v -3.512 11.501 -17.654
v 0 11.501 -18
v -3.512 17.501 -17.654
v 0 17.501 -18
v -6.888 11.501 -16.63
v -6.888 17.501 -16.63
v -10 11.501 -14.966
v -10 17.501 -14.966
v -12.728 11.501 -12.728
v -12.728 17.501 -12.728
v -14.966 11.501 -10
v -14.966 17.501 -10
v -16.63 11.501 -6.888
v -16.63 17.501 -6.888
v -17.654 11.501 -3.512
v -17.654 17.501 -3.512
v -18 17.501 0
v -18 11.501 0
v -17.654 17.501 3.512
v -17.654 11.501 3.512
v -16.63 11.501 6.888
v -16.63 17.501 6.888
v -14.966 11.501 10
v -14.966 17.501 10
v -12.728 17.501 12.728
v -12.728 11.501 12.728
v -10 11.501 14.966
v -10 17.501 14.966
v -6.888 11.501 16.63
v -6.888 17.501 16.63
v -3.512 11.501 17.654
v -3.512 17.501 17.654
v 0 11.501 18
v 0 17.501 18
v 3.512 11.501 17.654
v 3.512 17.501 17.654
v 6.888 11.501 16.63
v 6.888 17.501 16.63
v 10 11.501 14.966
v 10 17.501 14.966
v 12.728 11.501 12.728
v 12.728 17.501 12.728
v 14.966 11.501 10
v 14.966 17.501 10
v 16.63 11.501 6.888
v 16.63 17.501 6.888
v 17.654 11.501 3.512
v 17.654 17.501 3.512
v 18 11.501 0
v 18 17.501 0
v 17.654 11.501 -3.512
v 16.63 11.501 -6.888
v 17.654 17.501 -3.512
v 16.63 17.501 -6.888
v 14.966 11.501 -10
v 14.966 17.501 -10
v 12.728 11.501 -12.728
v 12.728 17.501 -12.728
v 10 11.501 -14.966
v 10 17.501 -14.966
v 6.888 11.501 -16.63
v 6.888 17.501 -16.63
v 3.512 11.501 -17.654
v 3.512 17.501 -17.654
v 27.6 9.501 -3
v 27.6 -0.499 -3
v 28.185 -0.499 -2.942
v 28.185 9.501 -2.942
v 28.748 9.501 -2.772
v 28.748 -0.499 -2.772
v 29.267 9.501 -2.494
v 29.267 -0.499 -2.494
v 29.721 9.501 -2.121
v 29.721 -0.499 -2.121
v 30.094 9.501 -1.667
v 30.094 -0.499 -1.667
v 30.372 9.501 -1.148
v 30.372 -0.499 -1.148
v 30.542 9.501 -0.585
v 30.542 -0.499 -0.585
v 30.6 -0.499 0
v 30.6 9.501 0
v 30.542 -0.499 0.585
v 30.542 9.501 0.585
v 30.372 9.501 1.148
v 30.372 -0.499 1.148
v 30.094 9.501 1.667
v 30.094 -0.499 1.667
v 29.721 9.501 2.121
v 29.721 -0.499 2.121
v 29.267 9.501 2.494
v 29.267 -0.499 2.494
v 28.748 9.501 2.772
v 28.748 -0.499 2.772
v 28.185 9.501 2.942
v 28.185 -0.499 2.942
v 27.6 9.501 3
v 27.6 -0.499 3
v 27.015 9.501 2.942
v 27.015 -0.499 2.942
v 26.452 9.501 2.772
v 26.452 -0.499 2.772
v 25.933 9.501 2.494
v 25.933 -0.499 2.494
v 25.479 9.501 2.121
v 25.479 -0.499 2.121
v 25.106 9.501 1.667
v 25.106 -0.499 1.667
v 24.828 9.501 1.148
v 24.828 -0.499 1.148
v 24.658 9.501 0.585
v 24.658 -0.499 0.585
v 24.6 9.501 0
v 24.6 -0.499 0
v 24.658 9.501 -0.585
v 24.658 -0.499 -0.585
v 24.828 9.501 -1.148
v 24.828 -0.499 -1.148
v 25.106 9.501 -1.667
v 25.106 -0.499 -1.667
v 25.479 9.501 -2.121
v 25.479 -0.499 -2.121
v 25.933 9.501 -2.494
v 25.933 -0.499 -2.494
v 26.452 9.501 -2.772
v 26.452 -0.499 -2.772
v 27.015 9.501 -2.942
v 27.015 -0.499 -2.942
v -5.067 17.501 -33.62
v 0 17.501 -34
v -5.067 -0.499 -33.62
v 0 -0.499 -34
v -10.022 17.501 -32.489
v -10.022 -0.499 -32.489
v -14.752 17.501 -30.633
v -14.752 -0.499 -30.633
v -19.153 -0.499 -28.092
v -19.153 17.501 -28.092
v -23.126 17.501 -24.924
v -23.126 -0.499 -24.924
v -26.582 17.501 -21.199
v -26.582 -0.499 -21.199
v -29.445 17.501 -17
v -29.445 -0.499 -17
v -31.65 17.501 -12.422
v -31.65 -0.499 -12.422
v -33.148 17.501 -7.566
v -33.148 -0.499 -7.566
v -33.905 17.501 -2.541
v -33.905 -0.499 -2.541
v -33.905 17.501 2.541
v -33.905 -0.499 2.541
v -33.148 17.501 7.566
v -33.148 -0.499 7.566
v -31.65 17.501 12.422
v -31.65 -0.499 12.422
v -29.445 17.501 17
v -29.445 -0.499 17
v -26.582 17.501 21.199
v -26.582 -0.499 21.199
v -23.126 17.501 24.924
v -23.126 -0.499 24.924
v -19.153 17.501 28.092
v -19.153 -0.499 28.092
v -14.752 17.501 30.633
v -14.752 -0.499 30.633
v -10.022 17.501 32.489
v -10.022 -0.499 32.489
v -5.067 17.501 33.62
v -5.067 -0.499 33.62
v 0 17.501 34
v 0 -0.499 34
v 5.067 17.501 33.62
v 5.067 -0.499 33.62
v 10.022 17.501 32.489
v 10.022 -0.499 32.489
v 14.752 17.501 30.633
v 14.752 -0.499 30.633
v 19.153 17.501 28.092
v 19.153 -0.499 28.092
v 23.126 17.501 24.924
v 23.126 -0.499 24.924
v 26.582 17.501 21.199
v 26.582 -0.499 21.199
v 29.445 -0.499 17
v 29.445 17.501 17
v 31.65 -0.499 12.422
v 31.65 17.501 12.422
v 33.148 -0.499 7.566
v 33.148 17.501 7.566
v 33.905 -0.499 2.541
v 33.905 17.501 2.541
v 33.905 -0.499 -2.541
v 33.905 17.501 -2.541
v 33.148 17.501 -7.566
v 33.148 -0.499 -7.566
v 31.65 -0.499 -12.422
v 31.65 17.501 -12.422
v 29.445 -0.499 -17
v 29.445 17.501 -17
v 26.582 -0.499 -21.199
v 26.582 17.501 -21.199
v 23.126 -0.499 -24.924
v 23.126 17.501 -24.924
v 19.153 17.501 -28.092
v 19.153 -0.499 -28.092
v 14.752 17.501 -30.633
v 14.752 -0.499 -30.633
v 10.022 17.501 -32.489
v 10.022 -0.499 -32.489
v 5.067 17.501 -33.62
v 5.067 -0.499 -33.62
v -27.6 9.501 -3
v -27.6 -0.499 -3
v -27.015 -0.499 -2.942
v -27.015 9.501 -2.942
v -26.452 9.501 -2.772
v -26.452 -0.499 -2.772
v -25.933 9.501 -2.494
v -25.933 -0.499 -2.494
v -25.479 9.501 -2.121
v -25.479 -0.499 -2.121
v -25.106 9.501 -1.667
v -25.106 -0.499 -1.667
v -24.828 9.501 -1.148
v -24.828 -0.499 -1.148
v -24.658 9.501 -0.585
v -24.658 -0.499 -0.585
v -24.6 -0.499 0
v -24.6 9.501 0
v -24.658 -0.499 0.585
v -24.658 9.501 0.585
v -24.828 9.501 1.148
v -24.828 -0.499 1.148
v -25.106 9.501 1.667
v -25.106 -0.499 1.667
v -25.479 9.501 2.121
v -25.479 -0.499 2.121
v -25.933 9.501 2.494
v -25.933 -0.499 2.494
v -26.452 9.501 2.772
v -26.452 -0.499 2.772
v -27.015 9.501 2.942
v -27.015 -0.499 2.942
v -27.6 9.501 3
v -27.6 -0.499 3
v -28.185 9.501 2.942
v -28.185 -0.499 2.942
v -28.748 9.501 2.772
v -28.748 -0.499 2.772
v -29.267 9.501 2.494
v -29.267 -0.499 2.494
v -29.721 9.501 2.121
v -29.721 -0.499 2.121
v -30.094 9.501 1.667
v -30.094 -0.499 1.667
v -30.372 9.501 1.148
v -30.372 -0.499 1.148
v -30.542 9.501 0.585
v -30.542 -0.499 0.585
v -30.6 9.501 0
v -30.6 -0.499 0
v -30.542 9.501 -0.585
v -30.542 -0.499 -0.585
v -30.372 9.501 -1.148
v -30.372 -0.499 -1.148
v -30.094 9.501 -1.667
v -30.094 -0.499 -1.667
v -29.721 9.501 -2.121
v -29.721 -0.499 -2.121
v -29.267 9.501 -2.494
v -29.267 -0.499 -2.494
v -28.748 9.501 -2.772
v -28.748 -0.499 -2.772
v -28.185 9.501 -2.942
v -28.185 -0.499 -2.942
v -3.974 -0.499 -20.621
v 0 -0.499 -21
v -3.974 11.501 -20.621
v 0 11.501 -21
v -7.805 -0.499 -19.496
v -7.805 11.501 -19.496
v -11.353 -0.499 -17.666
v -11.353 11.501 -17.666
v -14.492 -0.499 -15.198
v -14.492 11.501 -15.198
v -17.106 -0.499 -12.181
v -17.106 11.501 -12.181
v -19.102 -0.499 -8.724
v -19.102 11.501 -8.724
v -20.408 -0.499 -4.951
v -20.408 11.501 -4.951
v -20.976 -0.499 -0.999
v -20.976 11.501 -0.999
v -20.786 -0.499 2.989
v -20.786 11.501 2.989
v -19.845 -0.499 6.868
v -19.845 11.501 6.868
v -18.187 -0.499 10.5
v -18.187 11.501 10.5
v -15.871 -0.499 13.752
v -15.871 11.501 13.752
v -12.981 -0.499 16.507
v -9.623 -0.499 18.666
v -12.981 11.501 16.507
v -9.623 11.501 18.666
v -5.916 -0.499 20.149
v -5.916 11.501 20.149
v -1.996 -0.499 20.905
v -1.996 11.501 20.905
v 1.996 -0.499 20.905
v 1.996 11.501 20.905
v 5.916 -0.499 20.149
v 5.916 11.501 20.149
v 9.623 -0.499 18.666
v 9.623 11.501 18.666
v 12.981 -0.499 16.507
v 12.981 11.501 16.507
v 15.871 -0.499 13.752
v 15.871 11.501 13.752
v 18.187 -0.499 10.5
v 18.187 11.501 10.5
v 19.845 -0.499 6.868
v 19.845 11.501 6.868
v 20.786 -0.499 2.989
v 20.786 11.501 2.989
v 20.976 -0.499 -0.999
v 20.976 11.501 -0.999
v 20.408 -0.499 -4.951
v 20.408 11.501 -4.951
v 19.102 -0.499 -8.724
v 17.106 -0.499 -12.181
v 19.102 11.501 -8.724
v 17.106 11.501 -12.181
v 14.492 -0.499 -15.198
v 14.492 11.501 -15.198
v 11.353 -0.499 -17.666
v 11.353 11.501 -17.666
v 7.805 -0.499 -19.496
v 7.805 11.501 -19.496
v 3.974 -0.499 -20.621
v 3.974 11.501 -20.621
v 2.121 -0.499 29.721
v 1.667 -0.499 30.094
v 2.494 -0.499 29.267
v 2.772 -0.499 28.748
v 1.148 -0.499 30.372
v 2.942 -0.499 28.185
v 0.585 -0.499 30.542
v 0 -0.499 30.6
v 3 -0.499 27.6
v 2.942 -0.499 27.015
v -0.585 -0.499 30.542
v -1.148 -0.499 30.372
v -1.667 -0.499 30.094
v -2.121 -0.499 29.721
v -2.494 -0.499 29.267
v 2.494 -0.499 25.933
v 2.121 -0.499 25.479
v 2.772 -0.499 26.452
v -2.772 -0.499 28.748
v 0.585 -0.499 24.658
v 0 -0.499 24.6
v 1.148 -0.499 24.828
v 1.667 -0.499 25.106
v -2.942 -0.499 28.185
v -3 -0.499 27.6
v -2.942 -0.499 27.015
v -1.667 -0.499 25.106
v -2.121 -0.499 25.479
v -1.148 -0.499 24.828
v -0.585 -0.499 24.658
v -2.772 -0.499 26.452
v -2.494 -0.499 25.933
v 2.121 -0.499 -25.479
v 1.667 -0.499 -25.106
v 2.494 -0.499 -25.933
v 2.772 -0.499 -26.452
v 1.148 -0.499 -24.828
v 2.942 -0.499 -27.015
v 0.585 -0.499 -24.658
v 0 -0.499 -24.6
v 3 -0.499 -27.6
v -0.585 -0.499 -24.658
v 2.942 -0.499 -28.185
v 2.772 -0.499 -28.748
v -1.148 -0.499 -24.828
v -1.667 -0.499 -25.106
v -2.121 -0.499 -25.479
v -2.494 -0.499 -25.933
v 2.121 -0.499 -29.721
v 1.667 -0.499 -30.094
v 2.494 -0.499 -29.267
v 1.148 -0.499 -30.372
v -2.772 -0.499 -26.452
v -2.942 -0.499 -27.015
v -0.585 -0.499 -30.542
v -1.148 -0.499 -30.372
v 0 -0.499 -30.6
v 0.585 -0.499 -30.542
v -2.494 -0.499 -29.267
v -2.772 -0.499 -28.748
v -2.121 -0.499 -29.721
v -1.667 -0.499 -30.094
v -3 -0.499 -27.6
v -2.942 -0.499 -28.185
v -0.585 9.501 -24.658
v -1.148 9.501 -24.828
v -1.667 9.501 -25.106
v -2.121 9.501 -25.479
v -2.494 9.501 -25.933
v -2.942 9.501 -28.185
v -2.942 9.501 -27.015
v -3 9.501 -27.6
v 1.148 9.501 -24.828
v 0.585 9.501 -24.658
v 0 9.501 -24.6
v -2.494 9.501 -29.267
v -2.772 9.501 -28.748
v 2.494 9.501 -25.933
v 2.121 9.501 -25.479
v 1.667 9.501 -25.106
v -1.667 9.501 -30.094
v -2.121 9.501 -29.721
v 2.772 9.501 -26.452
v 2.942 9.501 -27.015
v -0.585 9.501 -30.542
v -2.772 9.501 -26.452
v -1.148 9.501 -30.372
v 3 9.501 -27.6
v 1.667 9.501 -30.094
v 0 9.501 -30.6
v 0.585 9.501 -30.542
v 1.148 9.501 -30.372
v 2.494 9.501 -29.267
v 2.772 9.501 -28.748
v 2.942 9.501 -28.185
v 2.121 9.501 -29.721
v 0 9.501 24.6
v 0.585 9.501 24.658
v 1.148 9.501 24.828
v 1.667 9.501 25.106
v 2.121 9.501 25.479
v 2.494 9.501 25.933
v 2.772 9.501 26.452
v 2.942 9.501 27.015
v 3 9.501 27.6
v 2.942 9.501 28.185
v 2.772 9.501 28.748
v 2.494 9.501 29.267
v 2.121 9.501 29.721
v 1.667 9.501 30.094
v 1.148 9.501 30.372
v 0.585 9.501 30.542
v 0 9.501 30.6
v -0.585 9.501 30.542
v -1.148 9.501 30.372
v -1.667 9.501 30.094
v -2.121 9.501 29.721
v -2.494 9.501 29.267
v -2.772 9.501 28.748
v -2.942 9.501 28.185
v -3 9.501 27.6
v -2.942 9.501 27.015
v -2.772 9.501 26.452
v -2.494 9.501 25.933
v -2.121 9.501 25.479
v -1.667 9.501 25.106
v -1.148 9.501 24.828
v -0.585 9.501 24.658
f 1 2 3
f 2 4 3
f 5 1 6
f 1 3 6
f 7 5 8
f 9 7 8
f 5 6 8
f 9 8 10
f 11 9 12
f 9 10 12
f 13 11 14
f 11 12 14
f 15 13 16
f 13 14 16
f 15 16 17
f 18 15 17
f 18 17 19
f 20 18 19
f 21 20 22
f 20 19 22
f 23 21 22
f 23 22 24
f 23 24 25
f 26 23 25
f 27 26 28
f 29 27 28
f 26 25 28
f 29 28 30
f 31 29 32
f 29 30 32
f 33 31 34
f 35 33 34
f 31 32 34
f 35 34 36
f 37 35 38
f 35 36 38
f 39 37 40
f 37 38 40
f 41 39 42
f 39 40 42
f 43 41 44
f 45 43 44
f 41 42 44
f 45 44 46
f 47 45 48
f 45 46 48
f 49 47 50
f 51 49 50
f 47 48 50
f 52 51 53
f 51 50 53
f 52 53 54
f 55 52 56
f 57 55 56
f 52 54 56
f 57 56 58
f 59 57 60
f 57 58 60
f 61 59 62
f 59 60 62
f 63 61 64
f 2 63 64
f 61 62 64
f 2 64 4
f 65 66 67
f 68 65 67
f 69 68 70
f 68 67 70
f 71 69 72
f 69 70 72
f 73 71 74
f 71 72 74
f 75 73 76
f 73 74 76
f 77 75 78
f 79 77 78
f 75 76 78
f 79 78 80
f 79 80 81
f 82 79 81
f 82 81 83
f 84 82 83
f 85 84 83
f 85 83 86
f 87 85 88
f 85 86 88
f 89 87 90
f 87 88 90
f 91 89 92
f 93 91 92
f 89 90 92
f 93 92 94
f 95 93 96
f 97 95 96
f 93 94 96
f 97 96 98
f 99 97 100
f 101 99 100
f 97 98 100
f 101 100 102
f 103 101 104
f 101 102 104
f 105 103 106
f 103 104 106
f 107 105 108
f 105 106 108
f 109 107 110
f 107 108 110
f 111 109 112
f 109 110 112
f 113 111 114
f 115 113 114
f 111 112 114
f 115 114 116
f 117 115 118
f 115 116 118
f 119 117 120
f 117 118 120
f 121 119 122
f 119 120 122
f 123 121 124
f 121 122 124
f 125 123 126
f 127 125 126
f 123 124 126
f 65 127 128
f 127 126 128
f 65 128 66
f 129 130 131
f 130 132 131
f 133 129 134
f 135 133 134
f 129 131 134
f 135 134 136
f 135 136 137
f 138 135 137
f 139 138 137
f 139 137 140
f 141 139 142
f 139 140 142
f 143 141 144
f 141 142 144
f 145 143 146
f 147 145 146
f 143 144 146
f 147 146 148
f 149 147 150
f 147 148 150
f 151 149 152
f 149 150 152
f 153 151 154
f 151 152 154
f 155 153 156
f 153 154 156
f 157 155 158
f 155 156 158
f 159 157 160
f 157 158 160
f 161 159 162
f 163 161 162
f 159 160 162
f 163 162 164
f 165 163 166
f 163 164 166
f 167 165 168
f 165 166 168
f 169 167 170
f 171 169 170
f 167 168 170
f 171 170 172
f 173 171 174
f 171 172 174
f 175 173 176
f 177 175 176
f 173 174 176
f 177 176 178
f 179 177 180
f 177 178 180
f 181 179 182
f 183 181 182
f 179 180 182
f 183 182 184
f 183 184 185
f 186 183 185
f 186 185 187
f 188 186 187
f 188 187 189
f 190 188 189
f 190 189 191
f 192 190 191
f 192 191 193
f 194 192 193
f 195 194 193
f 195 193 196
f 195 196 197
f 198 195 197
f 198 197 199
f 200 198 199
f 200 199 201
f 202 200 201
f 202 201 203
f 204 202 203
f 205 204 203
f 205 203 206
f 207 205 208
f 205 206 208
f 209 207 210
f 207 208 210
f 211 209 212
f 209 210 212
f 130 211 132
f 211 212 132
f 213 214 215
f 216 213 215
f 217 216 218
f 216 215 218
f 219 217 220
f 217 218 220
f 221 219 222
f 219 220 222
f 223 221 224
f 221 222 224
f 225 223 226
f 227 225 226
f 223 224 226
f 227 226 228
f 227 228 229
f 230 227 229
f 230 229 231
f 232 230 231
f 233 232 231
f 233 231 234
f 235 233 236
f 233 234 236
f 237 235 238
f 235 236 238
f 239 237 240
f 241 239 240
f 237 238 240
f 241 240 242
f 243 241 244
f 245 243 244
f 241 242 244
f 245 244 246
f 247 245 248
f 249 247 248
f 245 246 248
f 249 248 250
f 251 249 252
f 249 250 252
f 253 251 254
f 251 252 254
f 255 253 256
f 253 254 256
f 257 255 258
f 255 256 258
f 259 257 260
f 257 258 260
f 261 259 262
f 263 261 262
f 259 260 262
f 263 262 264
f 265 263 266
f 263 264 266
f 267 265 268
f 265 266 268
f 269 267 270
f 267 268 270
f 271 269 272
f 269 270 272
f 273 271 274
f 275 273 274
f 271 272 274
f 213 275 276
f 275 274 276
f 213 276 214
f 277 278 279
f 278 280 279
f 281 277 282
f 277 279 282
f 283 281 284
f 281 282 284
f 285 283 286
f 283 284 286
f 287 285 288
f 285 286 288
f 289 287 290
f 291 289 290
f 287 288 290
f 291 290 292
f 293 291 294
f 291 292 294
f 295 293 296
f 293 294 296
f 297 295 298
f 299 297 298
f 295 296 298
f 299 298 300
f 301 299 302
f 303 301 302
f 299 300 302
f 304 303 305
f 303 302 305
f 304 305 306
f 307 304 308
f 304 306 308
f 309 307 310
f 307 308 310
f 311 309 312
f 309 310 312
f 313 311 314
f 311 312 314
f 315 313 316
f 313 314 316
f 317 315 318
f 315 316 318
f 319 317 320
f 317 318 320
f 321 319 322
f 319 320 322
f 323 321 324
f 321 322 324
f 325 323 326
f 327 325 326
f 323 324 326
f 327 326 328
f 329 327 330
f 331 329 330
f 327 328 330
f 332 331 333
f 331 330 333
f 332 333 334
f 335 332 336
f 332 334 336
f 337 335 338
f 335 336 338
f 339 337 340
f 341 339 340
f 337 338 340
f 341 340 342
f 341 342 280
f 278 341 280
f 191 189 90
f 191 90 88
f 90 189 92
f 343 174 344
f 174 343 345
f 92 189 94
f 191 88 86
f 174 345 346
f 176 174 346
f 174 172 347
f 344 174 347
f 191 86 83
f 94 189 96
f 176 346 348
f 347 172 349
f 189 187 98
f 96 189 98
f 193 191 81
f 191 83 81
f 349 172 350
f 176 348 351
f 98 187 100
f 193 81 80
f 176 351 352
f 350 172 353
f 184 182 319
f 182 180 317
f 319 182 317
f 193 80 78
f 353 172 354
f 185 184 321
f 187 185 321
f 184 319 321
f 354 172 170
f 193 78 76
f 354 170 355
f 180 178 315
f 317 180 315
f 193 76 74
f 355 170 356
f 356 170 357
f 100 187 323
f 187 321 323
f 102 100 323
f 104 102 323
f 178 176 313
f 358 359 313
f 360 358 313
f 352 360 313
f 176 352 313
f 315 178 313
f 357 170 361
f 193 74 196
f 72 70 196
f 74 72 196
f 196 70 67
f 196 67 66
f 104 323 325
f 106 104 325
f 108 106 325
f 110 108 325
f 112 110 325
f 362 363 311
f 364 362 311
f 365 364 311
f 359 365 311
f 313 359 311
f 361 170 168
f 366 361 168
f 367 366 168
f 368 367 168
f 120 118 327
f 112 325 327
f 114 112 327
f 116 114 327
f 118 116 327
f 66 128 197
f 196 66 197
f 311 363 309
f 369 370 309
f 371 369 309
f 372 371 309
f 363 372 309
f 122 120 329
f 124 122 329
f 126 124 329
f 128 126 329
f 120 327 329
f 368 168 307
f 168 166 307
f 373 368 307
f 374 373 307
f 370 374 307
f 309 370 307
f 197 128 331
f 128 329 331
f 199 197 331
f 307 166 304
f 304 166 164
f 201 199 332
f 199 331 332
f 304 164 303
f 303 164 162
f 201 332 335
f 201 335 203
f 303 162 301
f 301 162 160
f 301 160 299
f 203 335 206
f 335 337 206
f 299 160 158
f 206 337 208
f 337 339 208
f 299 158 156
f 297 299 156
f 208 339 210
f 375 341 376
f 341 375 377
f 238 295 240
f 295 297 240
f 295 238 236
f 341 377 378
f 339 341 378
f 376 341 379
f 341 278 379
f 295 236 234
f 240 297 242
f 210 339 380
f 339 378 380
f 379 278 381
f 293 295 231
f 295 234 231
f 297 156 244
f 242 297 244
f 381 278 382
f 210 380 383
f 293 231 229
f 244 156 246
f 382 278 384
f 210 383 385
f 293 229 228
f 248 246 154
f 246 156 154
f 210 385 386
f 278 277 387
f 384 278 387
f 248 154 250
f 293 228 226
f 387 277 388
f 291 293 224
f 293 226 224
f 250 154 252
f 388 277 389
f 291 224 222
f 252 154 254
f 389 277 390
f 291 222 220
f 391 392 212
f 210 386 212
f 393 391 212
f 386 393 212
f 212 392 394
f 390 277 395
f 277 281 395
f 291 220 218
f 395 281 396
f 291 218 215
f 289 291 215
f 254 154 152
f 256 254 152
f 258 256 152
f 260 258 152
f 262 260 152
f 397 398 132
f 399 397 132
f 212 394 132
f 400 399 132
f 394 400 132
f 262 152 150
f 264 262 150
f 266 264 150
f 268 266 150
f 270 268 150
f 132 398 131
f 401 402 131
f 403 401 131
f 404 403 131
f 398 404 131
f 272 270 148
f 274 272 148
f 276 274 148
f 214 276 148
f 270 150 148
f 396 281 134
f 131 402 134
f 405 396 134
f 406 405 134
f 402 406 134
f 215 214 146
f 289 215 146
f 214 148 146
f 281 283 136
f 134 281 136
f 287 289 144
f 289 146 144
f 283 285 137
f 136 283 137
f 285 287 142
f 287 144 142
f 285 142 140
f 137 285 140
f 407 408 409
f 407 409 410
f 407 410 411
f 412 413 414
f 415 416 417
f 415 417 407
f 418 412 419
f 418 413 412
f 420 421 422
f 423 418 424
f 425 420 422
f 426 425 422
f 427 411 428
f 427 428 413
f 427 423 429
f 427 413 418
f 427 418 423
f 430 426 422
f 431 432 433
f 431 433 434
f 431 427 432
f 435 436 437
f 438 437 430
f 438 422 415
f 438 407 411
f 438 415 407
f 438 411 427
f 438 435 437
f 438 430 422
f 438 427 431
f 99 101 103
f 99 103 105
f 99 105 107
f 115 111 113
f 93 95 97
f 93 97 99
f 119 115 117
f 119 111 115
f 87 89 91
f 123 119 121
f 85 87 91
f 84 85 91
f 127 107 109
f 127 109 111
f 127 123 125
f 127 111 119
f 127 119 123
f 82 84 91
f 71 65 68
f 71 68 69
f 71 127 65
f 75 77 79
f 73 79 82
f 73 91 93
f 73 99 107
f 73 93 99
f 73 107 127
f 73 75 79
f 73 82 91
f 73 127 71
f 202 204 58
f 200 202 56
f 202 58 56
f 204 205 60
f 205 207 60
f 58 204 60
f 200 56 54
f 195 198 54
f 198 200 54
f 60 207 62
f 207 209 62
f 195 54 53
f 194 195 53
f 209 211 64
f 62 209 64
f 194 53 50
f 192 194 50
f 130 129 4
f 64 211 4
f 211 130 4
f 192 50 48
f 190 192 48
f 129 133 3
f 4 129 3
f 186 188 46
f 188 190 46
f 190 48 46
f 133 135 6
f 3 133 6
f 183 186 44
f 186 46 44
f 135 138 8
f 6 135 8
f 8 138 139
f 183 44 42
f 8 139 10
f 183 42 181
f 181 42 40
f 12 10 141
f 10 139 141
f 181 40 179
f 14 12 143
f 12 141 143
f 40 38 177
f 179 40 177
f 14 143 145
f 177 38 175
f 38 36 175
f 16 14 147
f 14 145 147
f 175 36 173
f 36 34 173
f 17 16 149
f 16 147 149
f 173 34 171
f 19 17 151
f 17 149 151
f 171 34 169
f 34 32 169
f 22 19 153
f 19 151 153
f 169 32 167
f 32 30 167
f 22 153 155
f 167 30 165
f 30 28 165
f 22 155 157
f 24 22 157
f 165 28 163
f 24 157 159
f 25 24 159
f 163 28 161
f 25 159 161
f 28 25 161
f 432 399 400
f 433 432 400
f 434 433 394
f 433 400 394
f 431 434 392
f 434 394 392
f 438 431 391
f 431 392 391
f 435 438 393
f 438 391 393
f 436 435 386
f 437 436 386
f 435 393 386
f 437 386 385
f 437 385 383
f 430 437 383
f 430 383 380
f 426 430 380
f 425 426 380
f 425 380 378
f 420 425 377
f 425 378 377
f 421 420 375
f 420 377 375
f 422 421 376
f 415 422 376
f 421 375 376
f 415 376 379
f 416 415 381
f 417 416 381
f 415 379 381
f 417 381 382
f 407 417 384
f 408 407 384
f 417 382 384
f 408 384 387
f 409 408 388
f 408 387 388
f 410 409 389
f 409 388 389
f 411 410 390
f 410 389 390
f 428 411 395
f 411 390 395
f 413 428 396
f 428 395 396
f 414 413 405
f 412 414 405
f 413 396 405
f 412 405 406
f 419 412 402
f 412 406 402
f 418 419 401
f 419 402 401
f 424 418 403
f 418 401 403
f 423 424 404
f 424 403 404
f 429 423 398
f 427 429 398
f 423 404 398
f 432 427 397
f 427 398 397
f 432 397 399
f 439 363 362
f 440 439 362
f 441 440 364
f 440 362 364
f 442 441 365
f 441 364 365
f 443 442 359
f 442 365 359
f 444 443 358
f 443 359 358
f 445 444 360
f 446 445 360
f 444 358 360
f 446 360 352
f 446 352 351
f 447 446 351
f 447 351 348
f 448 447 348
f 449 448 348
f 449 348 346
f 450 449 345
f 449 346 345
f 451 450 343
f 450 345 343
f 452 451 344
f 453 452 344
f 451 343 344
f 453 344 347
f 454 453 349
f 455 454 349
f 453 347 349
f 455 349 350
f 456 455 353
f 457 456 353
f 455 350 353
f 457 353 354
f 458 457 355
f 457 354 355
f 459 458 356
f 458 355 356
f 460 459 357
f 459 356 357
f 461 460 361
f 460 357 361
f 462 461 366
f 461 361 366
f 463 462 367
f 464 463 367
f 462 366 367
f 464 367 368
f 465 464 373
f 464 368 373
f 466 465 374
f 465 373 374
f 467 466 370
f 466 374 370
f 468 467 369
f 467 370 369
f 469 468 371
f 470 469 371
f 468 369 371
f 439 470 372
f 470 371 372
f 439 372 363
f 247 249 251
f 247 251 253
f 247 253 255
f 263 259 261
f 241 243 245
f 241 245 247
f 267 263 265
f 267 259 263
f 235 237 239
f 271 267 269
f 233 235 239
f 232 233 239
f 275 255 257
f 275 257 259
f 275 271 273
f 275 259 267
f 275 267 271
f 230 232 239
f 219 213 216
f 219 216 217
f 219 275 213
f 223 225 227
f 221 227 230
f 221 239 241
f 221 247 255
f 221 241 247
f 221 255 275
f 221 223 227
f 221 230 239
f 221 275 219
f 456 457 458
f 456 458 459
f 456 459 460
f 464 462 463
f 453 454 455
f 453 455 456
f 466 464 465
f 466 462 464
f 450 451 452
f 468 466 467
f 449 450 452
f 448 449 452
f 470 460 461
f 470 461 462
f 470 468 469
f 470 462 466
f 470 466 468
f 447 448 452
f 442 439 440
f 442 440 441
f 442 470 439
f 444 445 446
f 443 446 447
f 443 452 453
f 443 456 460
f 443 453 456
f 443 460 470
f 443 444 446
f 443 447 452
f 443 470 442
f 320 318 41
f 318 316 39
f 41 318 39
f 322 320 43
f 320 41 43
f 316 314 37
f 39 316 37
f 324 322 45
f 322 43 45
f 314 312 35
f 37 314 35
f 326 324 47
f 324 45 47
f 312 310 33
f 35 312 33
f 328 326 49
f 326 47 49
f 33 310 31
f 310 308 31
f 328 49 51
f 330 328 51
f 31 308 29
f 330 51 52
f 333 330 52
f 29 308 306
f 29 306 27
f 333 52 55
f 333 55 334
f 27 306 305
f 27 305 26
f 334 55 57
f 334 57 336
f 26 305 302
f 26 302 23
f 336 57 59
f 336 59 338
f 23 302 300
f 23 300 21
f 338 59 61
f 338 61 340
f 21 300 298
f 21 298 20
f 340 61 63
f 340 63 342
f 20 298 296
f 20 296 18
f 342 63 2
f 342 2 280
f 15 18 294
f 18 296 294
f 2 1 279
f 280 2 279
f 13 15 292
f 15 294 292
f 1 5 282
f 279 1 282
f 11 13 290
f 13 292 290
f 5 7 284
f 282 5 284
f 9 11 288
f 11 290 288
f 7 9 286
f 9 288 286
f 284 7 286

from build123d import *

# Parameters (mm, degrees)
CROQUIS4_R            = 3
CORTAR_EXTRUIR2_DEPTH = 10


with BuildPart() as part:
    # Croquis3 → Revolución1 (revolve)
    with BuildSketch(Plane.XY, mode=Mode.PRIVATE) as revoluci_n1_sk:
        Polygon((-18, 17.500583769), (-34, 17.500583769), (-34, -0.499416231), (-21, -0.499416231), (-21, 11.500583769), (-18, 11.500583769), align=None)
    revolve(revoluci_n1_sk.sketch.rotate(Axis((0, 0, 0), (0, 1, 0)), 270), axis=Axis((0, 0, 0), (0, 1, 0)))

    # Croquis4 → Cortar-Extruir2 (cut)
    with BuildSketch(Plane.XZ.offset(0.499416231)):
        with Locations(Location((0, 27.6, 0), (0, 0, 270))):
            Circle(CROQUIS4_R)
        with Locations(Location((27.6, 0, 0), (0, 0, 270))):
            Circle(CROQUIS4_R)
        with Locations(Location((0, -27.6, 0), (0, 0, 270))):
            Circle(CROQUIS4_R)
        with Locations(Location((-27.6, 0, 0), (0, 0, 270))):
            Circle(CROQUIS4_R)
    extrude(amount=-CORTAR_EXTRUIR2_DEPTH, mode=Mode.SUBTRACT)


solid = part.part
